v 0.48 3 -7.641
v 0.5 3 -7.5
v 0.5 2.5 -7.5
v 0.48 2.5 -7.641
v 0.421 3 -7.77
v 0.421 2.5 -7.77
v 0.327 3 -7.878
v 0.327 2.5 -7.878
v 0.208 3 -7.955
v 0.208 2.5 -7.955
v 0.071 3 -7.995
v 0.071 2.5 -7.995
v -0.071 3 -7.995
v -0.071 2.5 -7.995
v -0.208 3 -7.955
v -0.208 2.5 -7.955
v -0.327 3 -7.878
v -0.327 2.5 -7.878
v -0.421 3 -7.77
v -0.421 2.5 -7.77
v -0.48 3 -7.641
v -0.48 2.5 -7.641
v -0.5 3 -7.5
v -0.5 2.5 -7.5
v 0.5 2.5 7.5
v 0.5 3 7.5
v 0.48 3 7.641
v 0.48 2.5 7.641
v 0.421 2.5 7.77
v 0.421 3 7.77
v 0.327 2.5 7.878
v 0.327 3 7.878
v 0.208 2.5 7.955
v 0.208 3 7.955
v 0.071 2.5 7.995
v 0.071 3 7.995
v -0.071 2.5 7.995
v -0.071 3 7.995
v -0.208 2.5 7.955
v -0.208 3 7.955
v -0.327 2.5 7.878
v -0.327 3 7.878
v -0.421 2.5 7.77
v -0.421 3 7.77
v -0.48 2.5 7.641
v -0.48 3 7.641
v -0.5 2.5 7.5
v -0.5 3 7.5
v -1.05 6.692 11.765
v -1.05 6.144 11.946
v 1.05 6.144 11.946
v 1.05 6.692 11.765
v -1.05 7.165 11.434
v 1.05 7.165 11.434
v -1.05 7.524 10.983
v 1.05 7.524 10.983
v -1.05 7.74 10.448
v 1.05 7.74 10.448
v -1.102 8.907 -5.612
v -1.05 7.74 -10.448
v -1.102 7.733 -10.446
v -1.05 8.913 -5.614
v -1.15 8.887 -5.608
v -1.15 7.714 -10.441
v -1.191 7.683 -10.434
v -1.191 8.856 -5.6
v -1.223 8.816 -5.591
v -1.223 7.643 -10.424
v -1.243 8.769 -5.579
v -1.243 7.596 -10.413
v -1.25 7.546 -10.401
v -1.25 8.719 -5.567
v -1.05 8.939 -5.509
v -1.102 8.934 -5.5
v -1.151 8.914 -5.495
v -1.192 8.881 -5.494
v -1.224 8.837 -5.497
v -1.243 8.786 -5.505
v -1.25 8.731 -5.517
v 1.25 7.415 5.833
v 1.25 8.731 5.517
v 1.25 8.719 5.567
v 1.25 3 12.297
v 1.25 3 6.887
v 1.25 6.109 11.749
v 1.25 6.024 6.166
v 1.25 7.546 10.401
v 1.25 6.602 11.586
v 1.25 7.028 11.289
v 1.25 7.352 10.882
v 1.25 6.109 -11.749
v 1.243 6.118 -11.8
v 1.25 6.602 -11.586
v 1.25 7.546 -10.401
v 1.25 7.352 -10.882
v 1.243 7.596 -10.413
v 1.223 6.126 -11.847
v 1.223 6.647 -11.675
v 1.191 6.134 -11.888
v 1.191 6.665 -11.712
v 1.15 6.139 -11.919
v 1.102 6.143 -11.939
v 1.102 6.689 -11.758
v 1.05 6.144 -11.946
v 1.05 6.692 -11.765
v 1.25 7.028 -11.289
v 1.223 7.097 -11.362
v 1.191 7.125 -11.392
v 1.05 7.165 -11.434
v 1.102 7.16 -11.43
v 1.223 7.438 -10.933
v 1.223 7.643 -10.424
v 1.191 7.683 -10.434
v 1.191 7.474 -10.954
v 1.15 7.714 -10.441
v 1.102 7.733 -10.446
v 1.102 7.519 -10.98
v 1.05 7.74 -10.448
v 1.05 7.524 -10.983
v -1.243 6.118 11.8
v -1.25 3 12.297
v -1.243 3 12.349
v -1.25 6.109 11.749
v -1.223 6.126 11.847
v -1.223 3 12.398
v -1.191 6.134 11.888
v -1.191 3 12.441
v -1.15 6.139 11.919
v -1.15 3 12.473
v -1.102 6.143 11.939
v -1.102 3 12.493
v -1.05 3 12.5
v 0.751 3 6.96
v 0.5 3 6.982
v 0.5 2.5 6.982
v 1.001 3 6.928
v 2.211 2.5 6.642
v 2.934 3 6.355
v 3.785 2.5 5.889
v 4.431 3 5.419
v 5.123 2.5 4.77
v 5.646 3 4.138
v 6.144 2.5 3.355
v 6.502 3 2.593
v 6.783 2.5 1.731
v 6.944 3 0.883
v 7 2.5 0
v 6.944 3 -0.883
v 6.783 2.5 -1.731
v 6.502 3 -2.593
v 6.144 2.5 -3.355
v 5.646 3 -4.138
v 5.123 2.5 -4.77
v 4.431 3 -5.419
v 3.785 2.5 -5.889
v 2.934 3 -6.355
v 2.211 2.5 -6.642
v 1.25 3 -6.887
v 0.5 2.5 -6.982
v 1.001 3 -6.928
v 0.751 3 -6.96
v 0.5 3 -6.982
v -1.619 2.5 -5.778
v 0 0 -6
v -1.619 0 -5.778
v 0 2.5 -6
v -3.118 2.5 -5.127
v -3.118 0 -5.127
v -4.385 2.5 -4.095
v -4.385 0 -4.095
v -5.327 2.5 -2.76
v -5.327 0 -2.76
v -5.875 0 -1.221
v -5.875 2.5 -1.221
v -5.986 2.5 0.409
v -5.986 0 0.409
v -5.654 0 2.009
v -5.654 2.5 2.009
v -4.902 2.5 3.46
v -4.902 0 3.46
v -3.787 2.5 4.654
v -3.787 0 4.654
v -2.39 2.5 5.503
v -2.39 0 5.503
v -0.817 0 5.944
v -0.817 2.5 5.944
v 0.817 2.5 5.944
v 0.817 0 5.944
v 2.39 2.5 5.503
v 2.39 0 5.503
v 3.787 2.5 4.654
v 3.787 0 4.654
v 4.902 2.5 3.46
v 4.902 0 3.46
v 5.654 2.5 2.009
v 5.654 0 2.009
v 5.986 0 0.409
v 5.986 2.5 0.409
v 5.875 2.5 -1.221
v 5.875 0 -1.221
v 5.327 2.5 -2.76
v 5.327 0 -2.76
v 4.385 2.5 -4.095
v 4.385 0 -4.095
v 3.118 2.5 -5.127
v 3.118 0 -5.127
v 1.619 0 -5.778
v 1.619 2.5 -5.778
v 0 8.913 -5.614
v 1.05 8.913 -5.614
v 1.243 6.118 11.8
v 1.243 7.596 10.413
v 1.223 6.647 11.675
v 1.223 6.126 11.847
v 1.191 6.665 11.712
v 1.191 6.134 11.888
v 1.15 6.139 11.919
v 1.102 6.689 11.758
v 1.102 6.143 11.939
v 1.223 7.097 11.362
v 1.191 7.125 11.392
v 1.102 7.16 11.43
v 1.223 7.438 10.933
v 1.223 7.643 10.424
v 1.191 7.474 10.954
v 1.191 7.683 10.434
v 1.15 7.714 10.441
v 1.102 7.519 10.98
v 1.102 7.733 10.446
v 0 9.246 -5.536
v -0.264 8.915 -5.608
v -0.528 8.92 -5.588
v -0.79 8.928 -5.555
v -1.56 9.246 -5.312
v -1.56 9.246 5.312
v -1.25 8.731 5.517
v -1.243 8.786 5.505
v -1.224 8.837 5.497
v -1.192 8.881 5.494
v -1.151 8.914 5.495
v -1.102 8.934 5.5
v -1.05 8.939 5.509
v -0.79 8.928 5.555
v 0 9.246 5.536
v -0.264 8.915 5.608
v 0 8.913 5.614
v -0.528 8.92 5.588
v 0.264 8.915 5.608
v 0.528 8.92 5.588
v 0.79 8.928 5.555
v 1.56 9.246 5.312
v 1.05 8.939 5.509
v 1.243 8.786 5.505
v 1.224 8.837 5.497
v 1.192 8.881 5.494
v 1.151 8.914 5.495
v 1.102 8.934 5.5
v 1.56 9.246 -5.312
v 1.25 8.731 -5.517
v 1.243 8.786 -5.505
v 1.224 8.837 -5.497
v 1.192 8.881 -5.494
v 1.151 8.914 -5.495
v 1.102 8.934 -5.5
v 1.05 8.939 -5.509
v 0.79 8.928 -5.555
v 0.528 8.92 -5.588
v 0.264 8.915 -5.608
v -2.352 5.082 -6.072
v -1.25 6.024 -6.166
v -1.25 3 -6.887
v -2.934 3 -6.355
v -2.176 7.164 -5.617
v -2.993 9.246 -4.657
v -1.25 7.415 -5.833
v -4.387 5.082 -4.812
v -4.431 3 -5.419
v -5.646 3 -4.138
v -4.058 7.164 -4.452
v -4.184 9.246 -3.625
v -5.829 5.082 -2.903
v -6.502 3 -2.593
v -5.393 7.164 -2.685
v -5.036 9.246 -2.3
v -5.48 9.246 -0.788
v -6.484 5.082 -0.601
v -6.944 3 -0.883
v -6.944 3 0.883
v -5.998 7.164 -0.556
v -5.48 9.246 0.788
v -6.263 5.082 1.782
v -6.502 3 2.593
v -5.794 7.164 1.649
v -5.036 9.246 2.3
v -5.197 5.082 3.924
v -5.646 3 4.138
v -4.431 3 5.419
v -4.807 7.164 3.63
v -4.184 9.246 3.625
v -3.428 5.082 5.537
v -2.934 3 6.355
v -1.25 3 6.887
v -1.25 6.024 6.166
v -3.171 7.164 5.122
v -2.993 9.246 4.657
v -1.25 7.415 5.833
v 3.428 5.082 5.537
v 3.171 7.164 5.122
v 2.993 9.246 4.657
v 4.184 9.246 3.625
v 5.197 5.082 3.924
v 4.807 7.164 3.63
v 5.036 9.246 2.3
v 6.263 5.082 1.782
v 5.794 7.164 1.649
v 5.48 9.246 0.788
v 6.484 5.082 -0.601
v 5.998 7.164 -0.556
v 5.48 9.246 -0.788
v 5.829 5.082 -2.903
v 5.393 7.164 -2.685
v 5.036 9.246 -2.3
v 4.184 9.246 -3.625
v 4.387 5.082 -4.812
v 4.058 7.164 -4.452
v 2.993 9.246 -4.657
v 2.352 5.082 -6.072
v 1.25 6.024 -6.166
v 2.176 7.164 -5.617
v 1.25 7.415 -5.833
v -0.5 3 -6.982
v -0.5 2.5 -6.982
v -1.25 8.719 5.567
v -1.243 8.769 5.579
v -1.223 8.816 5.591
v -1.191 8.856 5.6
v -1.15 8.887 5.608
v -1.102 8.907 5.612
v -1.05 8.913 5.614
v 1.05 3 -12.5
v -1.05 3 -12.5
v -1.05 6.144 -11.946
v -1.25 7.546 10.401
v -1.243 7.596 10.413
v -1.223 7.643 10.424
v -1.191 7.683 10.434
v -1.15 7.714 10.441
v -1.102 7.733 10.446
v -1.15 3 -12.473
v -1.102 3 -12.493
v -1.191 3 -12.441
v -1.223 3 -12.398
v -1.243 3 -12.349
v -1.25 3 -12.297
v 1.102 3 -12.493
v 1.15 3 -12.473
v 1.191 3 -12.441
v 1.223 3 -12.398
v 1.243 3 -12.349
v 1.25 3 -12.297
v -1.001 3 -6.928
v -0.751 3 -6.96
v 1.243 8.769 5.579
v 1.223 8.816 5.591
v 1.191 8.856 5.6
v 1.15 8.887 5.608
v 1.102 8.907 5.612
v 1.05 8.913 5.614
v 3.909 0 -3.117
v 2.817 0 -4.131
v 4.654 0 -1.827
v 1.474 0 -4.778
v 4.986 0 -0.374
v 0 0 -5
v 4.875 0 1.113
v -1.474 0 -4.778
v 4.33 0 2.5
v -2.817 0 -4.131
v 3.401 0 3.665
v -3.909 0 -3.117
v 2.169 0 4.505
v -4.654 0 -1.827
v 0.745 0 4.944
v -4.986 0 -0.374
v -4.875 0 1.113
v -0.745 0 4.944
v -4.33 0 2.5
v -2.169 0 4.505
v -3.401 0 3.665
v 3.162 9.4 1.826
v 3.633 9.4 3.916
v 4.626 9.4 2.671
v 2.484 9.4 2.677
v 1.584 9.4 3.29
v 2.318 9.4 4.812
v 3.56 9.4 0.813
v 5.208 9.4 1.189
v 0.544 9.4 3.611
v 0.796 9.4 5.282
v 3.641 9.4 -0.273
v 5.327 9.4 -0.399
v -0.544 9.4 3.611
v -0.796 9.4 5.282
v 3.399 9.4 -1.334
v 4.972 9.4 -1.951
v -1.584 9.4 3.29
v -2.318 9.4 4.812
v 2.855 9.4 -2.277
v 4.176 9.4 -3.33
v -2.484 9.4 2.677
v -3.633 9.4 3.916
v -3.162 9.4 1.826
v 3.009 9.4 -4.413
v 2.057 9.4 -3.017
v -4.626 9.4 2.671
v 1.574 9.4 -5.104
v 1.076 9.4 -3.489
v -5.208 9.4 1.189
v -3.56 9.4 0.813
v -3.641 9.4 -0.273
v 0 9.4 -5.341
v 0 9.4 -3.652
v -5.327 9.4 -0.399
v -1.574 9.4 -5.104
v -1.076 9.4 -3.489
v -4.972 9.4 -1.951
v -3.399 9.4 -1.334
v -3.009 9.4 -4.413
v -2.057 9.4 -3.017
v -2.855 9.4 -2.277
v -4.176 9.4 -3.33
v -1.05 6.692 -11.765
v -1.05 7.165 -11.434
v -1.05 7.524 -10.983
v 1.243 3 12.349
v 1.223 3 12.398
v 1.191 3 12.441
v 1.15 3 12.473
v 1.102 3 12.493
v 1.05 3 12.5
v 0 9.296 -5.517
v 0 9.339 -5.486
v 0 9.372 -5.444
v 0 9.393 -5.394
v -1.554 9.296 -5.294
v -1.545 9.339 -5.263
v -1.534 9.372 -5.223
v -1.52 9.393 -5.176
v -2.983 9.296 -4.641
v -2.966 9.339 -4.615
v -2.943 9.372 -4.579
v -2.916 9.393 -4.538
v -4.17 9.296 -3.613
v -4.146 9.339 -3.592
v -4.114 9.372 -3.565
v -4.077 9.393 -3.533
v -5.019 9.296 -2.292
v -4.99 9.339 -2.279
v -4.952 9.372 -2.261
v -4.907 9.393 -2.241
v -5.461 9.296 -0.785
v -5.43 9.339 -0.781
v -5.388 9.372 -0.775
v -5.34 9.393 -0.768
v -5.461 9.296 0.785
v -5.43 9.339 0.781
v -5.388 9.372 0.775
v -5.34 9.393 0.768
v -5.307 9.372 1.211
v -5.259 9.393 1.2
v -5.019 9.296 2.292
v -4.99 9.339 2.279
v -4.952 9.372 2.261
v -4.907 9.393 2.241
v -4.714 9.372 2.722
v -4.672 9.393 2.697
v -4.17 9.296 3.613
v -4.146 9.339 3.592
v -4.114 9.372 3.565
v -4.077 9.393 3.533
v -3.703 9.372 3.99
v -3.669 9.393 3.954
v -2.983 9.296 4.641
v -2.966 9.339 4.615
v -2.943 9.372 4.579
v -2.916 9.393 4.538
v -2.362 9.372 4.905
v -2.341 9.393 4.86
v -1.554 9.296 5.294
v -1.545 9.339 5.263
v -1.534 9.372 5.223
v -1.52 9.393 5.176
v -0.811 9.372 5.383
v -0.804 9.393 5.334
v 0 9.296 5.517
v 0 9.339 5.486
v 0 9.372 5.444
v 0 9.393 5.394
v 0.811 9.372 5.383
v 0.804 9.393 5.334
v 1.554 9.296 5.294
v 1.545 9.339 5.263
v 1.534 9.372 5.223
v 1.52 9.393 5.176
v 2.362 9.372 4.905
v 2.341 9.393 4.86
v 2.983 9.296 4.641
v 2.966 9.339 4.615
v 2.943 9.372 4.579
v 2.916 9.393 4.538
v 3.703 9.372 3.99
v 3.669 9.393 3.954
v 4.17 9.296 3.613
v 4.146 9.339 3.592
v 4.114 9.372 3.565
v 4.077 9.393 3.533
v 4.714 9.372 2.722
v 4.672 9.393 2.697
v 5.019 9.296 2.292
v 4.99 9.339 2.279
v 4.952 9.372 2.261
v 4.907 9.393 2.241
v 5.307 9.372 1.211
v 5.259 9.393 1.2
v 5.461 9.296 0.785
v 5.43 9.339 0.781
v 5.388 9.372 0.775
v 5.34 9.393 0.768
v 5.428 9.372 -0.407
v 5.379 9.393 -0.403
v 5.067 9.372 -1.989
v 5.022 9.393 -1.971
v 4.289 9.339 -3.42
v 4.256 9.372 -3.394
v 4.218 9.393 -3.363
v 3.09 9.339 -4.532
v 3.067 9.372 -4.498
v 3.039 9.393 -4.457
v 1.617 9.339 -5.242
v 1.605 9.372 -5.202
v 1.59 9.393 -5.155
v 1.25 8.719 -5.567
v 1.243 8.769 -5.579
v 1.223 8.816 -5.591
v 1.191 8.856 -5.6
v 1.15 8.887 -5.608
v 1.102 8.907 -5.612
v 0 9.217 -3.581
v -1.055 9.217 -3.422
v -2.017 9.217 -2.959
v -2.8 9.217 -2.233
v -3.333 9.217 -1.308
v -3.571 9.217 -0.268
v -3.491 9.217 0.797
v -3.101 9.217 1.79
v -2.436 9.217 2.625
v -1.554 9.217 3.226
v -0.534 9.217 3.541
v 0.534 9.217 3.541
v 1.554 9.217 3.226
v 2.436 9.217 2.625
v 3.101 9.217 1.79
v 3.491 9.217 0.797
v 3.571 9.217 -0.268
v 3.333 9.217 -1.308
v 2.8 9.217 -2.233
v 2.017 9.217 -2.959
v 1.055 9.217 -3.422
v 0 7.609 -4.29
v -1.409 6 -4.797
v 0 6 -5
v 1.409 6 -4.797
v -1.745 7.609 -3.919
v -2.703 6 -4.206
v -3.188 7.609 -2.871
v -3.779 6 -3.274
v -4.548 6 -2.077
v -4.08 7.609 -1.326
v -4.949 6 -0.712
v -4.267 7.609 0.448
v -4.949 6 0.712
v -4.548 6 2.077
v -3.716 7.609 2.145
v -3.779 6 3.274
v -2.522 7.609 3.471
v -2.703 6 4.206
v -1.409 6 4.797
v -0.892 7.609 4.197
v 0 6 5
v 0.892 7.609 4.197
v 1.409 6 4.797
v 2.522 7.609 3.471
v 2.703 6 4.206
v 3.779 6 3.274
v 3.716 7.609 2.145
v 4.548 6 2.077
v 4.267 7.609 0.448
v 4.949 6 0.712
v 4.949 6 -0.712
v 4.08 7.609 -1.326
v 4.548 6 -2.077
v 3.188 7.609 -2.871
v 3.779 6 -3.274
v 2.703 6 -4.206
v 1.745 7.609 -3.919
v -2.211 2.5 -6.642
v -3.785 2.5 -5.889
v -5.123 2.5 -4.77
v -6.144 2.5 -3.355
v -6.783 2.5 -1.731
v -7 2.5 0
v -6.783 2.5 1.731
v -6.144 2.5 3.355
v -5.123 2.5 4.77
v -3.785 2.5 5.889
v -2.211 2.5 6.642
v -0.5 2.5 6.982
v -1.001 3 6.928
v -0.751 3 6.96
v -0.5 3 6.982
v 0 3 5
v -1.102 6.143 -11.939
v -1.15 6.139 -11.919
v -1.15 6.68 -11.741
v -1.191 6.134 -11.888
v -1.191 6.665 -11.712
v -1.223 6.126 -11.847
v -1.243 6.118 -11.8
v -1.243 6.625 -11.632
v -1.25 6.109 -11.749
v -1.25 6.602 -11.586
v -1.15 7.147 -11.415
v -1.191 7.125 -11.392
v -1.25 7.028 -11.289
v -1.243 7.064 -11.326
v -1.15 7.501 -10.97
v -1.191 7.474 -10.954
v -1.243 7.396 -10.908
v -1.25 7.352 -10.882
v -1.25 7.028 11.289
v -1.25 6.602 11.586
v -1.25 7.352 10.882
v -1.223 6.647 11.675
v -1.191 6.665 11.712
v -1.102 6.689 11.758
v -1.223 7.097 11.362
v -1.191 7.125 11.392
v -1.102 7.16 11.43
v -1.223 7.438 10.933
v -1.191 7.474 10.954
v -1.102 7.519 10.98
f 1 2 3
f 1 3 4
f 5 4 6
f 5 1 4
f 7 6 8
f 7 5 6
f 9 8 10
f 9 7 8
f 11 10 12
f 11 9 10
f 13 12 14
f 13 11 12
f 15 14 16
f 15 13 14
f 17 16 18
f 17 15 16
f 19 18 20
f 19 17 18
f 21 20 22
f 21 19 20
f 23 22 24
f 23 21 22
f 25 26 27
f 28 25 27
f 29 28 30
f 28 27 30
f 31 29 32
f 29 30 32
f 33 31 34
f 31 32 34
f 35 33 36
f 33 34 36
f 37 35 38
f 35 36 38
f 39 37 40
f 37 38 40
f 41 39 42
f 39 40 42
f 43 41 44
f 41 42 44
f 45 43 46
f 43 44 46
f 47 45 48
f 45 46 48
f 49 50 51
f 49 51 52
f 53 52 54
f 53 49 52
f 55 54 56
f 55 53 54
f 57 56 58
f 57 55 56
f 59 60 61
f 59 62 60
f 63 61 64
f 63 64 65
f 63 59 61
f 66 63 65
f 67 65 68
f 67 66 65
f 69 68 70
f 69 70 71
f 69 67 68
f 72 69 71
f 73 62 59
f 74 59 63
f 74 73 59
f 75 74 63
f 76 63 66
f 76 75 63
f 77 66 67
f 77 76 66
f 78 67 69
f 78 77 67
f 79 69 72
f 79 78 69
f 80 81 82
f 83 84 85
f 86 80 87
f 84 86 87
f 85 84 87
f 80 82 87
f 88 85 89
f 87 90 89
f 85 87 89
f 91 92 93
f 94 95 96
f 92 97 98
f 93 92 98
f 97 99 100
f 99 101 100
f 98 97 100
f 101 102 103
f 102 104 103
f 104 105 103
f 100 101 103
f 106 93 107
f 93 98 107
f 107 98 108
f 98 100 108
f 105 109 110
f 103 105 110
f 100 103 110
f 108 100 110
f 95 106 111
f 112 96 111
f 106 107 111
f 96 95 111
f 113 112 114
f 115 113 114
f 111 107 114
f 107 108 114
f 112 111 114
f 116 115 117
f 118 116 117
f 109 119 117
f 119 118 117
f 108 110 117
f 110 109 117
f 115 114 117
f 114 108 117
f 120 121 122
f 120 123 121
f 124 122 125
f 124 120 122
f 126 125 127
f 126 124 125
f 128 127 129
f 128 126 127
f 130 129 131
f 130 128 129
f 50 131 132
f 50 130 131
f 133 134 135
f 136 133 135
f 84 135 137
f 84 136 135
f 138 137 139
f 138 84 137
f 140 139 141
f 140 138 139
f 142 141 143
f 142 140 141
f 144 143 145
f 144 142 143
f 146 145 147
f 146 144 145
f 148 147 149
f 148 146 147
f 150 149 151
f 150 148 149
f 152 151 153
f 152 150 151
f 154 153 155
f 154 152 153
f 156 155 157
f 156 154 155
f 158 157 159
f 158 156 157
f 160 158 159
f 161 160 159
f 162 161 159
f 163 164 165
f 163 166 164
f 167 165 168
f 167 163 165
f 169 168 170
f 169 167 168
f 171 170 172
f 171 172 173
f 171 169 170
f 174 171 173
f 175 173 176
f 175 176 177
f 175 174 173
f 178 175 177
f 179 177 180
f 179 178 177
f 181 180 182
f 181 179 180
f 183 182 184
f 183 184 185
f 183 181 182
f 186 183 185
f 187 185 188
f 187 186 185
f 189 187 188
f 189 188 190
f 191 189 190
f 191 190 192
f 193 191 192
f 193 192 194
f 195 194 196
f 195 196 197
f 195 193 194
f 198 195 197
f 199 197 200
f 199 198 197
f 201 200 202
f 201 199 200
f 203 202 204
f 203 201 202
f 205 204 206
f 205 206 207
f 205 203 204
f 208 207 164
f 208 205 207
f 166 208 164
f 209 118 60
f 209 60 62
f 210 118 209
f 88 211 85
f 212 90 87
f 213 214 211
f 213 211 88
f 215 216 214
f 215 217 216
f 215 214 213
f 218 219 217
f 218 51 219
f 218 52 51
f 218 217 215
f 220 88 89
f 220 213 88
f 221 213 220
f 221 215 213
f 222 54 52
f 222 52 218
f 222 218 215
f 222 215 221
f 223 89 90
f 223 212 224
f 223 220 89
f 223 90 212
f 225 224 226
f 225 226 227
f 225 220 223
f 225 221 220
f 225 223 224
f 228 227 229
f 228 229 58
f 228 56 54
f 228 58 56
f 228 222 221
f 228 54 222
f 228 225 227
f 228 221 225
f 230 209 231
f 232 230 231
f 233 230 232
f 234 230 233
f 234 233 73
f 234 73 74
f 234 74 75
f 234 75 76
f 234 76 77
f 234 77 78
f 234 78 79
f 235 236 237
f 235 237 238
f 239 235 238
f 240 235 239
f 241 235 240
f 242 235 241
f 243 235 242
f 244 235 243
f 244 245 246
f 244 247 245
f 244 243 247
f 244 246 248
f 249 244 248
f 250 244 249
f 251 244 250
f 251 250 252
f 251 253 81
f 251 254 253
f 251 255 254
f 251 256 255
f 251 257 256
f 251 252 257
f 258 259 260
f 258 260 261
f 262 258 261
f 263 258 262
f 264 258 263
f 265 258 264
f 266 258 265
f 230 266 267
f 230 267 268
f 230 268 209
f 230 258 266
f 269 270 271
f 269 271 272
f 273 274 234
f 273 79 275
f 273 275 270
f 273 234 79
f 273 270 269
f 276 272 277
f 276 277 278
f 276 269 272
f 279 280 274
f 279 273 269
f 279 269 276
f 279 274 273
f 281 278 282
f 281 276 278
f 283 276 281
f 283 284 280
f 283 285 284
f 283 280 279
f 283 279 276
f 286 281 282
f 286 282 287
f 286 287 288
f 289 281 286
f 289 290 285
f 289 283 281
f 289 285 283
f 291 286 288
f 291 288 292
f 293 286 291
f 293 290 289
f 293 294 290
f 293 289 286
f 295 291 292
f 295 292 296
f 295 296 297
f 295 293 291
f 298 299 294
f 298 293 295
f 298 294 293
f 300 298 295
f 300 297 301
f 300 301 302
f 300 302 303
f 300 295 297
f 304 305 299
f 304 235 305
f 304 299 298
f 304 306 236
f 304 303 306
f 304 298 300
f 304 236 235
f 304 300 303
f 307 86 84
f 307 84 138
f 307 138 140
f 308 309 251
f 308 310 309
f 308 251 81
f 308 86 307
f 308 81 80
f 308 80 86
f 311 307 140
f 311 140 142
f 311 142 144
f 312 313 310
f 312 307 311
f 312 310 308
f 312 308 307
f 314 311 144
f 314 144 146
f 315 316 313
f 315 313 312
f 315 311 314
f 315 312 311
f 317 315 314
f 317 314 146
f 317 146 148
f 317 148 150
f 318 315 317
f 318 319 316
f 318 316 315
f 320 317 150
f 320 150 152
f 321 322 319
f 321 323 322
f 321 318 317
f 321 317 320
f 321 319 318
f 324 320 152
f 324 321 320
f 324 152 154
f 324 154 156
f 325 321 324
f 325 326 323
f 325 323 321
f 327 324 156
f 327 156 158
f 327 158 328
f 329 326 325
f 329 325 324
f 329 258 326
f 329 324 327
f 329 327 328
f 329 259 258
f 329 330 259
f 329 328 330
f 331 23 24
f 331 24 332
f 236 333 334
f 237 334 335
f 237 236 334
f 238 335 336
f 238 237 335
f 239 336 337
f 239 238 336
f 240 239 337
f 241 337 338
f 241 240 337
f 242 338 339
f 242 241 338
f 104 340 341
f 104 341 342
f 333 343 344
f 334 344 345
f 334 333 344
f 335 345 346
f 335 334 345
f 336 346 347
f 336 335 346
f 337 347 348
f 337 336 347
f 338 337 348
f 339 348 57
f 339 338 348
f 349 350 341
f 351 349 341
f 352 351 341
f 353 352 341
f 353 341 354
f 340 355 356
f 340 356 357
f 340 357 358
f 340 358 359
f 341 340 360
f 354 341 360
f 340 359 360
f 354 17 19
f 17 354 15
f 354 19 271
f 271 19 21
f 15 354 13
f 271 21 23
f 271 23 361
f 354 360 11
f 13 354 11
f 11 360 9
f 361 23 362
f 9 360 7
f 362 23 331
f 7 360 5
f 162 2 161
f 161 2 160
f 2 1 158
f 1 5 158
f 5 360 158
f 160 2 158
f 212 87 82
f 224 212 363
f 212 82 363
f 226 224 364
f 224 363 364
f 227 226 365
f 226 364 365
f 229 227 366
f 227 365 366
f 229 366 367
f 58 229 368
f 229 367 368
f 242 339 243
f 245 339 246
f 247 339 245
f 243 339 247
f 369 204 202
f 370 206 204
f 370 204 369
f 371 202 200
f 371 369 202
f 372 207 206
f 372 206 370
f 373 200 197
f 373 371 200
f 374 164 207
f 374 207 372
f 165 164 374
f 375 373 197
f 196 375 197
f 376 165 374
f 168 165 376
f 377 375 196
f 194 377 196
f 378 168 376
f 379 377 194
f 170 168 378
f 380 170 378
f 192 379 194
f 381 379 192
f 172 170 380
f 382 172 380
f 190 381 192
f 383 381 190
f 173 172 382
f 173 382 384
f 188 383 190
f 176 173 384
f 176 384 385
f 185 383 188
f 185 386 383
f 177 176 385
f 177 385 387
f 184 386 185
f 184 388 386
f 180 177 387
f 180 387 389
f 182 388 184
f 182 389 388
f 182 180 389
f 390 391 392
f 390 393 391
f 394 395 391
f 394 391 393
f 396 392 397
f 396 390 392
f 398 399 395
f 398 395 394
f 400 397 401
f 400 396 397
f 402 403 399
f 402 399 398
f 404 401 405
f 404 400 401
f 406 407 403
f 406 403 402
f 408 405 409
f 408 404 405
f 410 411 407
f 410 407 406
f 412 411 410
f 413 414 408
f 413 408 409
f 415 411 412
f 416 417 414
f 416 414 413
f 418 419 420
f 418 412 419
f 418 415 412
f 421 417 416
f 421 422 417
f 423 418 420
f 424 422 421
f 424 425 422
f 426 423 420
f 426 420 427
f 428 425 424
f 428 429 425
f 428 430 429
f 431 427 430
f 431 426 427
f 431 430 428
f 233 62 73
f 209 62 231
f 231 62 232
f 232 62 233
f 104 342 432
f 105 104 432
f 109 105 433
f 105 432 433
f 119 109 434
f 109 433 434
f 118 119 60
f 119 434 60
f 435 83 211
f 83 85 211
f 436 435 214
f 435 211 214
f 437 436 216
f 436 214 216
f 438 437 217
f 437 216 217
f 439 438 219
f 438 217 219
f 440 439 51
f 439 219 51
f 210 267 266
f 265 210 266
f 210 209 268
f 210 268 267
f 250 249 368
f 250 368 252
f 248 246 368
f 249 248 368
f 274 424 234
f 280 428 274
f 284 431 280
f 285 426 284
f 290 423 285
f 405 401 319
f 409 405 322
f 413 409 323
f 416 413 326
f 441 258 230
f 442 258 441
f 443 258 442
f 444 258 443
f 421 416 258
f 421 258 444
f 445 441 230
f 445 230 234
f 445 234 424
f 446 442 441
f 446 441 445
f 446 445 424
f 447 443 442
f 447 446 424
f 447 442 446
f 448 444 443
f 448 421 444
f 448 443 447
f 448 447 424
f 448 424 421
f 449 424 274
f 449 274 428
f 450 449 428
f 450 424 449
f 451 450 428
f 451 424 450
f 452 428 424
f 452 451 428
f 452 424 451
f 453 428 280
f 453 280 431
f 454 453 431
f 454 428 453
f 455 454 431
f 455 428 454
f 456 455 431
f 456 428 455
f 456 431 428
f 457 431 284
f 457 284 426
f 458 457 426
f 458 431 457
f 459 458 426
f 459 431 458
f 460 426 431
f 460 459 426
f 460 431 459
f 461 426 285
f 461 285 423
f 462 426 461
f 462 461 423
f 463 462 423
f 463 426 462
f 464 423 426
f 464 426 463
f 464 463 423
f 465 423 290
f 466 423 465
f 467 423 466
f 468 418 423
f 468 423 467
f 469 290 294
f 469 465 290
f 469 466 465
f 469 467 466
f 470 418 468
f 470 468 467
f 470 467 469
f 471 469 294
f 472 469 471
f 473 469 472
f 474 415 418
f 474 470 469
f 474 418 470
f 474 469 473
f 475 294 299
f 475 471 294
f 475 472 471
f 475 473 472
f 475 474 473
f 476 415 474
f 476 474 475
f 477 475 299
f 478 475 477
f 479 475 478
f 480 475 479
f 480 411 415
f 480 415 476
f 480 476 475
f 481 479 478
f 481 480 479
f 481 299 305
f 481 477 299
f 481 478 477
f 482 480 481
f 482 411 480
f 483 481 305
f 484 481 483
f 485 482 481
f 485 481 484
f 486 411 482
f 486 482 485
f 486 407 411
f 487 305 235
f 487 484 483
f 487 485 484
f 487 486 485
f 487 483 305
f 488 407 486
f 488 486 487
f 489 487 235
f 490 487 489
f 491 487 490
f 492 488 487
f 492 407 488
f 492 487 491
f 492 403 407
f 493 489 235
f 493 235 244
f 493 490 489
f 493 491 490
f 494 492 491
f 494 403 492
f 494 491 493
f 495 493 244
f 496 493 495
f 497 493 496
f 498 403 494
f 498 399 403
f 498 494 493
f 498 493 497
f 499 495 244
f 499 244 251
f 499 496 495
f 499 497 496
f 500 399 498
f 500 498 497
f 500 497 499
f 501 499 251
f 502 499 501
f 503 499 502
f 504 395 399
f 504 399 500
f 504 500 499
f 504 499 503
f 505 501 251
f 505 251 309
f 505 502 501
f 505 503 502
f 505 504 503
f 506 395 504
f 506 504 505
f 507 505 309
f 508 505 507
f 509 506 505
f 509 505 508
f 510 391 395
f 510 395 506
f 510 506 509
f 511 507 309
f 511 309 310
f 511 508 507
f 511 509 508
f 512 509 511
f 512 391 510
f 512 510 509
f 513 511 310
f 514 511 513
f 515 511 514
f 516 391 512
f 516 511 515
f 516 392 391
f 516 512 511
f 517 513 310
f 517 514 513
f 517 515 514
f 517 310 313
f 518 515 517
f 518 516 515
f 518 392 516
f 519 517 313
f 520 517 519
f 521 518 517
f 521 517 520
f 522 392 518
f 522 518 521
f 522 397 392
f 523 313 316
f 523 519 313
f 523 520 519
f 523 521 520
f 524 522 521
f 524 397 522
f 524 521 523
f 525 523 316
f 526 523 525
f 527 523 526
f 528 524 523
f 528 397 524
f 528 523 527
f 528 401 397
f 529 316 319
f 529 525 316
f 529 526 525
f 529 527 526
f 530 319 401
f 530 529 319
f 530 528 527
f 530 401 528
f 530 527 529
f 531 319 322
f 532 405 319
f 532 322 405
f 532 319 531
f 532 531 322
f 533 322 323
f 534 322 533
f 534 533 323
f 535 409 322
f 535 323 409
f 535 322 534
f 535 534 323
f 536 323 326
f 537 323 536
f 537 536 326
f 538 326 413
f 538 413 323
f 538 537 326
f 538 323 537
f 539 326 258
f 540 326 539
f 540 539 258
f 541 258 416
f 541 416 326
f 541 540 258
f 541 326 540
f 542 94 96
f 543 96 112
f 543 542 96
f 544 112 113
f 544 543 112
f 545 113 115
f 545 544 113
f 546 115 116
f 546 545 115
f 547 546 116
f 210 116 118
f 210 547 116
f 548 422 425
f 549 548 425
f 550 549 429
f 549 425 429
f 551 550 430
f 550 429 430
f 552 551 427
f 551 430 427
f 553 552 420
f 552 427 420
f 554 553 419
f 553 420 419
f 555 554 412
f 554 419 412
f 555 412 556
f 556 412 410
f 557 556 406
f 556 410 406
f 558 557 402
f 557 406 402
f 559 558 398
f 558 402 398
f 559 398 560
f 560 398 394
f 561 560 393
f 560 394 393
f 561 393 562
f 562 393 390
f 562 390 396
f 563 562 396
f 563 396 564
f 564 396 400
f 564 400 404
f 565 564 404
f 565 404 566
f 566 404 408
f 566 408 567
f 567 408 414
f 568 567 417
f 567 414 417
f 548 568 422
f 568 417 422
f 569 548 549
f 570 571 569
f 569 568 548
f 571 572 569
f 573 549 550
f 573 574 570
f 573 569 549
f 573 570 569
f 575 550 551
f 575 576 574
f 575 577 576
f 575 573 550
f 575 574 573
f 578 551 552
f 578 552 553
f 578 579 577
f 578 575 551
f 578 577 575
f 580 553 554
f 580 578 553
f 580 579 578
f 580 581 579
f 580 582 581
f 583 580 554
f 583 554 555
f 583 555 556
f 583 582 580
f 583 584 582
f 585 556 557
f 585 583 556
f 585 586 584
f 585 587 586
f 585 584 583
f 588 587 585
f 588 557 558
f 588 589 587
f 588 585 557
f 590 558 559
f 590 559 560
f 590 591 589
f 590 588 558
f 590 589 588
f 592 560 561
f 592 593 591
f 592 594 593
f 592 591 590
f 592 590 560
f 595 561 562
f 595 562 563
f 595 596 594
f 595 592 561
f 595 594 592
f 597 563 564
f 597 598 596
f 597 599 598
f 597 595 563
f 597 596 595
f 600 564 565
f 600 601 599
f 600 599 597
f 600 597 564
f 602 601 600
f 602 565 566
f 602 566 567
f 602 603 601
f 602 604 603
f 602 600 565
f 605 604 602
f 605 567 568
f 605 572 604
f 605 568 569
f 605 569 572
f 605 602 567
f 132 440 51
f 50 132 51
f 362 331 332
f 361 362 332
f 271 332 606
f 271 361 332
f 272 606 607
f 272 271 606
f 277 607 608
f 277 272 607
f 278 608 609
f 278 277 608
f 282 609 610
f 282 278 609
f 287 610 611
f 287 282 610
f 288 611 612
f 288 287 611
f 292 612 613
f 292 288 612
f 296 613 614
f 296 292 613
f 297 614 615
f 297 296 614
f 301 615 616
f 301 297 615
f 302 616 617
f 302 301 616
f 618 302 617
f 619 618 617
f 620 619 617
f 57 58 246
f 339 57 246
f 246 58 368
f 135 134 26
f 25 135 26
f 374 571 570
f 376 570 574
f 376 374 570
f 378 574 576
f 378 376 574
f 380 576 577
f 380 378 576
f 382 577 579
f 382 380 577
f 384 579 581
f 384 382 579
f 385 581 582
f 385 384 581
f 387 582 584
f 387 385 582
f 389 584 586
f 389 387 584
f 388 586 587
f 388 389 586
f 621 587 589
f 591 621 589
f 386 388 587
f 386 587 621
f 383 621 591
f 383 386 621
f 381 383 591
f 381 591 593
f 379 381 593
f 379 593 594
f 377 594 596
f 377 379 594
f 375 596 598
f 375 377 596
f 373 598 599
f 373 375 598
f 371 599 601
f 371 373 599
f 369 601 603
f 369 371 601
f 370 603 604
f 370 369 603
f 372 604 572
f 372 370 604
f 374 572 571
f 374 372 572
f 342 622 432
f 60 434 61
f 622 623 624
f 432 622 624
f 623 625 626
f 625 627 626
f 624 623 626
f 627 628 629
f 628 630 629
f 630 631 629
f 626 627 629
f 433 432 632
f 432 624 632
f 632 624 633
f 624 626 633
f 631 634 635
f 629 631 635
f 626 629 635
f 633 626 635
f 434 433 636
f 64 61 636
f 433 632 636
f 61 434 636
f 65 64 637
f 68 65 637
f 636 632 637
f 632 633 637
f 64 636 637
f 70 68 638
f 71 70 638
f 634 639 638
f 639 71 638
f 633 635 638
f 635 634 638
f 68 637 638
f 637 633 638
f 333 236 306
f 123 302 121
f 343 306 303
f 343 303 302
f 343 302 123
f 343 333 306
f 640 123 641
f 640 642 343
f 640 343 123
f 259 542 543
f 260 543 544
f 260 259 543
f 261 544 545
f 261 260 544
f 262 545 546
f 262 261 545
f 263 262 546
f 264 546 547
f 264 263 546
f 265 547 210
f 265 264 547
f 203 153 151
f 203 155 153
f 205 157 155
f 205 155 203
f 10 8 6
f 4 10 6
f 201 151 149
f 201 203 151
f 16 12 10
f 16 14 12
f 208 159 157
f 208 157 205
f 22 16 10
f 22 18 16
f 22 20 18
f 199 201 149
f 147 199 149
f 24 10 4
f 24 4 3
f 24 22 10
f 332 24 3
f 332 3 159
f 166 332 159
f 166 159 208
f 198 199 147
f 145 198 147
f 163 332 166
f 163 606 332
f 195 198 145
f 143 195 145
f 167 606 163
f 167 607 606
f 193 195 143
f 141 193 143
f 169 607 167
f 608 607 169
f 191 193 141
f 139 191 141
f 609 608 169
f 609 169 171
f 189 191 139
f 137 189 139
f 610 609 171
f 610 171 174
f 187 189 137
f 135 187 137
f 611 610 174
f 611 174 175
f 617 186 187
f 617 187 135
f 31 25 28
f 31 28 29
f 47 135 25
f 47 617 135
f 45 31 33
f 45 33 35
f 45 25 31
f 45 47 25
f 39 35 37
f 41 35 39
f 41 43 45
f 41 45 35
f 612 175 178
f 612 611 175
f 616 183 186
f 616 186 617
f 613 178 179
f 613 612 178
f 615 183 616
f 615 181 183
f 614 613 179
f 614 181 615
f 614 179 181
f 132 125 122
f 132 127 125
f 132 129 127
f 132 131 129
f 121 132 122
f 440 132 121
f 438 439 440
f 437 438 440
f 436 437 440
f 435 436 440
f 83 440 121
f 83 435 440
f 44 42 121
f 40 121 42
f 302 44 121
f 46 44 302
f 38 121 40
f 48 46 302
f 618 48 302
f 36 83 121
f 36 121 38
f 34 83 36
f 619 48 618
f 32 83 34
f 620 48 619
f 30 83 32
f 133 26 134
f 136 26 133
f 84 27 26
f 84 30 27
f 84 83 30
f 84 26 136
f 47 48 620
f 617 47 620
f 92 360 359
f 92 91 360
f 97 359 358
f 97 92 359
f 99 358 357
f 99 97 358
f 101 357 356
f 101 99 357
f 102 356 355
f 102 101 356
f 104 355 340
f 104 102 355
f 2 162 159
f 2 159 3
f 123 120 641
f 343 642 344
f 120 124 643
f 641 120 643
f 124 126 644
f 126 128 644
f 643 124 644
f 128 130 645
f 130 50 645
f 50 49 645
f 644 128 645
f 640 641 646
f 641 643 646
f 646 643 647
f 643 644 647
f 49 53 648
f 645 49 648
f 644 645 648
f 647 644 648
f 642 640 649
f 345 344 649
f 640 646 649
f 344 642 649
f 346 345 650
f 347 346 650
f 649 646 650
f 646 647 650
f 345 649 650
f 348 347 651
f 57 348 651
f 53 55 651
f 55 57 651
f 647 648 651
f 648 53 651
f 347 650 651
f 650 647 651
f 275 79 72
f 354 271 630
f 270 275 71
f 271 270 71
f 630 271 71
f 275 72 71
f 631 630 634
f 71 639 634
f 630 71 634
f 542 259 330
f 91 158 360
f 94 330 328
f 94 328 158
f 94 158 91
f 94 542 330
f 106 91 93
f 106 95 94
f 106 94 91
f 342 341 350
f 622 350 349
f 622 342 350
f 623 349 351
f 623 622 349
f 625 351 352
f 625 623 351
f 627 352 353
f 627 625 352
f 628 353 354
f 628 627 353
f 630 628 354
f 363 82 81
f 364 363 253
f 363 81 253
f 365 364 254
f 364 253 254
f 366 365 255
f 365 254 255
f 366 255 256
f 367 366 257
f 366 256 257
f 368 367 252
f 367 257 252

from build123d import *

# Parameters (mm, degrees)
EXTRUDE_1_DEPTH        = 1.25
EXTRUDE_2_DEPTH        = 0.5
FILLET_1_R             = 2
FILLET_1_OF_MIRROR_1_R = 2
FILLET_2_R             = 0.2
CHAMFER_1_SIZE         = 0.2
CHAMFER_1_SIZE2        = 0.15168085


with BuildPart() as part:
    # 草图1 → 旋转1 (revolve)
    with BuildSketch(Plane.XY):
        Polygon((6, 0), (6, 2.5), (7, 2.5), (7, 3), (5.5, 9.4), (3.5, 9.4), (5, 6), (5, 0), align=None)
    revolve(axis=Axis((0, 0, 0), (0, 1, 0)))

    # 草图2 → 凸台-拉伸1 (add, symmetric)
    with BuildSketch(Plane(origin=(0, 0, 0), x_dir=(0, 0, -1), z_dir=(1, 0, 0))):
        Polygon((-7, 3), (-12.5, 3), (-11.7185832, 7.431634889), (-5.614095661, 8.913191845), (-5, 9.062232643), (-5, 3), align=None)
    extrude_1 = extrude(amount=EXTRUDE_1_DEPTH, both=True)

    # 草图3 → 凸台-拉伸2 (add)
    with BuildSketch(Plane.XZ.offset(-3)):
        with BuildLine():
            Line((-0.5, 7.5), (-0.5, 6.982120022))
            ThreePointArc((-0.5, 6.982120022), (0, 7), (0.5, 6.982120022))
            Line((0.5, 6.982120022), (0.5, 7.5))
            ThreePointArc((0.5, 7.5), (0, 8), (-0.5, 7.5))
        make_face()
    extrude_2 = extrude(amount=EXTRUDE_2_DEPTH)

    # 圆角1
    fillet_1_edges = [part.edges().sort_by_distance(p)[0] for p in [
        (0, 7.431634889, 11.7185832),
    ]]
    fillet(fillet_1_edges, radius=FILLET_1_R)

    # 镜向1: 凸台-拉伸1, 凸台-拉伸2 across plane
    add(extrude_1.mirror(Plane.XY))
    add(extrude_2.mirror(Plane.XY))

    # 圆角1 of 镜向1
    fillet_1_of_mirror_1_edges = [part.edges().sort_by_distance(p)[0] for p in [
        (0, 7.431634889, -11.7185832),
    ]]
    fillet(fillet_1_of_mirror_1_edges, radius=FILLET_1_OF_MIRROR_1_R)

    # 圆角2
    fillet_2_edges = [part.edges().sort_by_distance(p)[0] for p in [
        (-1.25, 4.571891442, -12.222833128),
        (-1.25, 7.165047592, -11.434488481),
        (1.25, 4.571891442, -12.222833128),
        (1.25, 7.165047592, -11.434488481),
        (-1.25, 4.571891442, 12.222833128),
        (-1.25, 7.165047592, 11.434488481),
        (1.25, 4.571891442, 12.222833128),
        (1.25, 7.165047592, 11.434488481),
        (-1.25, 8.344789205, -7.956095957),
        (1.25, 8.344789205, -7.956095957),
        (-1.25, 8.344789205, 7.956095957),
        (1.25, 8.344789205, 7.956095957),
        (-5.5, 9.4, 0),
    ]]
    fillet(fillet_2_edges, radius=FILLET_2_R)

    # 倒角1
    chamfer_1_edges = [part.edges().sort_by_distance(p)[0] for p in [
        (-3.5, 9.4, 0),
    ]]
    chamfer_1_side = [part.faces().sort_by_distance(p)[0] for p in [
        (-4.25, 7.7, 0),
    ]]
    chamfer(chamfer_1_edges, length=CHAMFER_1_SIZE, length2=CHAMFER_1_SIZE2, reference=chamfer_1_side[0])


solid = part.part
